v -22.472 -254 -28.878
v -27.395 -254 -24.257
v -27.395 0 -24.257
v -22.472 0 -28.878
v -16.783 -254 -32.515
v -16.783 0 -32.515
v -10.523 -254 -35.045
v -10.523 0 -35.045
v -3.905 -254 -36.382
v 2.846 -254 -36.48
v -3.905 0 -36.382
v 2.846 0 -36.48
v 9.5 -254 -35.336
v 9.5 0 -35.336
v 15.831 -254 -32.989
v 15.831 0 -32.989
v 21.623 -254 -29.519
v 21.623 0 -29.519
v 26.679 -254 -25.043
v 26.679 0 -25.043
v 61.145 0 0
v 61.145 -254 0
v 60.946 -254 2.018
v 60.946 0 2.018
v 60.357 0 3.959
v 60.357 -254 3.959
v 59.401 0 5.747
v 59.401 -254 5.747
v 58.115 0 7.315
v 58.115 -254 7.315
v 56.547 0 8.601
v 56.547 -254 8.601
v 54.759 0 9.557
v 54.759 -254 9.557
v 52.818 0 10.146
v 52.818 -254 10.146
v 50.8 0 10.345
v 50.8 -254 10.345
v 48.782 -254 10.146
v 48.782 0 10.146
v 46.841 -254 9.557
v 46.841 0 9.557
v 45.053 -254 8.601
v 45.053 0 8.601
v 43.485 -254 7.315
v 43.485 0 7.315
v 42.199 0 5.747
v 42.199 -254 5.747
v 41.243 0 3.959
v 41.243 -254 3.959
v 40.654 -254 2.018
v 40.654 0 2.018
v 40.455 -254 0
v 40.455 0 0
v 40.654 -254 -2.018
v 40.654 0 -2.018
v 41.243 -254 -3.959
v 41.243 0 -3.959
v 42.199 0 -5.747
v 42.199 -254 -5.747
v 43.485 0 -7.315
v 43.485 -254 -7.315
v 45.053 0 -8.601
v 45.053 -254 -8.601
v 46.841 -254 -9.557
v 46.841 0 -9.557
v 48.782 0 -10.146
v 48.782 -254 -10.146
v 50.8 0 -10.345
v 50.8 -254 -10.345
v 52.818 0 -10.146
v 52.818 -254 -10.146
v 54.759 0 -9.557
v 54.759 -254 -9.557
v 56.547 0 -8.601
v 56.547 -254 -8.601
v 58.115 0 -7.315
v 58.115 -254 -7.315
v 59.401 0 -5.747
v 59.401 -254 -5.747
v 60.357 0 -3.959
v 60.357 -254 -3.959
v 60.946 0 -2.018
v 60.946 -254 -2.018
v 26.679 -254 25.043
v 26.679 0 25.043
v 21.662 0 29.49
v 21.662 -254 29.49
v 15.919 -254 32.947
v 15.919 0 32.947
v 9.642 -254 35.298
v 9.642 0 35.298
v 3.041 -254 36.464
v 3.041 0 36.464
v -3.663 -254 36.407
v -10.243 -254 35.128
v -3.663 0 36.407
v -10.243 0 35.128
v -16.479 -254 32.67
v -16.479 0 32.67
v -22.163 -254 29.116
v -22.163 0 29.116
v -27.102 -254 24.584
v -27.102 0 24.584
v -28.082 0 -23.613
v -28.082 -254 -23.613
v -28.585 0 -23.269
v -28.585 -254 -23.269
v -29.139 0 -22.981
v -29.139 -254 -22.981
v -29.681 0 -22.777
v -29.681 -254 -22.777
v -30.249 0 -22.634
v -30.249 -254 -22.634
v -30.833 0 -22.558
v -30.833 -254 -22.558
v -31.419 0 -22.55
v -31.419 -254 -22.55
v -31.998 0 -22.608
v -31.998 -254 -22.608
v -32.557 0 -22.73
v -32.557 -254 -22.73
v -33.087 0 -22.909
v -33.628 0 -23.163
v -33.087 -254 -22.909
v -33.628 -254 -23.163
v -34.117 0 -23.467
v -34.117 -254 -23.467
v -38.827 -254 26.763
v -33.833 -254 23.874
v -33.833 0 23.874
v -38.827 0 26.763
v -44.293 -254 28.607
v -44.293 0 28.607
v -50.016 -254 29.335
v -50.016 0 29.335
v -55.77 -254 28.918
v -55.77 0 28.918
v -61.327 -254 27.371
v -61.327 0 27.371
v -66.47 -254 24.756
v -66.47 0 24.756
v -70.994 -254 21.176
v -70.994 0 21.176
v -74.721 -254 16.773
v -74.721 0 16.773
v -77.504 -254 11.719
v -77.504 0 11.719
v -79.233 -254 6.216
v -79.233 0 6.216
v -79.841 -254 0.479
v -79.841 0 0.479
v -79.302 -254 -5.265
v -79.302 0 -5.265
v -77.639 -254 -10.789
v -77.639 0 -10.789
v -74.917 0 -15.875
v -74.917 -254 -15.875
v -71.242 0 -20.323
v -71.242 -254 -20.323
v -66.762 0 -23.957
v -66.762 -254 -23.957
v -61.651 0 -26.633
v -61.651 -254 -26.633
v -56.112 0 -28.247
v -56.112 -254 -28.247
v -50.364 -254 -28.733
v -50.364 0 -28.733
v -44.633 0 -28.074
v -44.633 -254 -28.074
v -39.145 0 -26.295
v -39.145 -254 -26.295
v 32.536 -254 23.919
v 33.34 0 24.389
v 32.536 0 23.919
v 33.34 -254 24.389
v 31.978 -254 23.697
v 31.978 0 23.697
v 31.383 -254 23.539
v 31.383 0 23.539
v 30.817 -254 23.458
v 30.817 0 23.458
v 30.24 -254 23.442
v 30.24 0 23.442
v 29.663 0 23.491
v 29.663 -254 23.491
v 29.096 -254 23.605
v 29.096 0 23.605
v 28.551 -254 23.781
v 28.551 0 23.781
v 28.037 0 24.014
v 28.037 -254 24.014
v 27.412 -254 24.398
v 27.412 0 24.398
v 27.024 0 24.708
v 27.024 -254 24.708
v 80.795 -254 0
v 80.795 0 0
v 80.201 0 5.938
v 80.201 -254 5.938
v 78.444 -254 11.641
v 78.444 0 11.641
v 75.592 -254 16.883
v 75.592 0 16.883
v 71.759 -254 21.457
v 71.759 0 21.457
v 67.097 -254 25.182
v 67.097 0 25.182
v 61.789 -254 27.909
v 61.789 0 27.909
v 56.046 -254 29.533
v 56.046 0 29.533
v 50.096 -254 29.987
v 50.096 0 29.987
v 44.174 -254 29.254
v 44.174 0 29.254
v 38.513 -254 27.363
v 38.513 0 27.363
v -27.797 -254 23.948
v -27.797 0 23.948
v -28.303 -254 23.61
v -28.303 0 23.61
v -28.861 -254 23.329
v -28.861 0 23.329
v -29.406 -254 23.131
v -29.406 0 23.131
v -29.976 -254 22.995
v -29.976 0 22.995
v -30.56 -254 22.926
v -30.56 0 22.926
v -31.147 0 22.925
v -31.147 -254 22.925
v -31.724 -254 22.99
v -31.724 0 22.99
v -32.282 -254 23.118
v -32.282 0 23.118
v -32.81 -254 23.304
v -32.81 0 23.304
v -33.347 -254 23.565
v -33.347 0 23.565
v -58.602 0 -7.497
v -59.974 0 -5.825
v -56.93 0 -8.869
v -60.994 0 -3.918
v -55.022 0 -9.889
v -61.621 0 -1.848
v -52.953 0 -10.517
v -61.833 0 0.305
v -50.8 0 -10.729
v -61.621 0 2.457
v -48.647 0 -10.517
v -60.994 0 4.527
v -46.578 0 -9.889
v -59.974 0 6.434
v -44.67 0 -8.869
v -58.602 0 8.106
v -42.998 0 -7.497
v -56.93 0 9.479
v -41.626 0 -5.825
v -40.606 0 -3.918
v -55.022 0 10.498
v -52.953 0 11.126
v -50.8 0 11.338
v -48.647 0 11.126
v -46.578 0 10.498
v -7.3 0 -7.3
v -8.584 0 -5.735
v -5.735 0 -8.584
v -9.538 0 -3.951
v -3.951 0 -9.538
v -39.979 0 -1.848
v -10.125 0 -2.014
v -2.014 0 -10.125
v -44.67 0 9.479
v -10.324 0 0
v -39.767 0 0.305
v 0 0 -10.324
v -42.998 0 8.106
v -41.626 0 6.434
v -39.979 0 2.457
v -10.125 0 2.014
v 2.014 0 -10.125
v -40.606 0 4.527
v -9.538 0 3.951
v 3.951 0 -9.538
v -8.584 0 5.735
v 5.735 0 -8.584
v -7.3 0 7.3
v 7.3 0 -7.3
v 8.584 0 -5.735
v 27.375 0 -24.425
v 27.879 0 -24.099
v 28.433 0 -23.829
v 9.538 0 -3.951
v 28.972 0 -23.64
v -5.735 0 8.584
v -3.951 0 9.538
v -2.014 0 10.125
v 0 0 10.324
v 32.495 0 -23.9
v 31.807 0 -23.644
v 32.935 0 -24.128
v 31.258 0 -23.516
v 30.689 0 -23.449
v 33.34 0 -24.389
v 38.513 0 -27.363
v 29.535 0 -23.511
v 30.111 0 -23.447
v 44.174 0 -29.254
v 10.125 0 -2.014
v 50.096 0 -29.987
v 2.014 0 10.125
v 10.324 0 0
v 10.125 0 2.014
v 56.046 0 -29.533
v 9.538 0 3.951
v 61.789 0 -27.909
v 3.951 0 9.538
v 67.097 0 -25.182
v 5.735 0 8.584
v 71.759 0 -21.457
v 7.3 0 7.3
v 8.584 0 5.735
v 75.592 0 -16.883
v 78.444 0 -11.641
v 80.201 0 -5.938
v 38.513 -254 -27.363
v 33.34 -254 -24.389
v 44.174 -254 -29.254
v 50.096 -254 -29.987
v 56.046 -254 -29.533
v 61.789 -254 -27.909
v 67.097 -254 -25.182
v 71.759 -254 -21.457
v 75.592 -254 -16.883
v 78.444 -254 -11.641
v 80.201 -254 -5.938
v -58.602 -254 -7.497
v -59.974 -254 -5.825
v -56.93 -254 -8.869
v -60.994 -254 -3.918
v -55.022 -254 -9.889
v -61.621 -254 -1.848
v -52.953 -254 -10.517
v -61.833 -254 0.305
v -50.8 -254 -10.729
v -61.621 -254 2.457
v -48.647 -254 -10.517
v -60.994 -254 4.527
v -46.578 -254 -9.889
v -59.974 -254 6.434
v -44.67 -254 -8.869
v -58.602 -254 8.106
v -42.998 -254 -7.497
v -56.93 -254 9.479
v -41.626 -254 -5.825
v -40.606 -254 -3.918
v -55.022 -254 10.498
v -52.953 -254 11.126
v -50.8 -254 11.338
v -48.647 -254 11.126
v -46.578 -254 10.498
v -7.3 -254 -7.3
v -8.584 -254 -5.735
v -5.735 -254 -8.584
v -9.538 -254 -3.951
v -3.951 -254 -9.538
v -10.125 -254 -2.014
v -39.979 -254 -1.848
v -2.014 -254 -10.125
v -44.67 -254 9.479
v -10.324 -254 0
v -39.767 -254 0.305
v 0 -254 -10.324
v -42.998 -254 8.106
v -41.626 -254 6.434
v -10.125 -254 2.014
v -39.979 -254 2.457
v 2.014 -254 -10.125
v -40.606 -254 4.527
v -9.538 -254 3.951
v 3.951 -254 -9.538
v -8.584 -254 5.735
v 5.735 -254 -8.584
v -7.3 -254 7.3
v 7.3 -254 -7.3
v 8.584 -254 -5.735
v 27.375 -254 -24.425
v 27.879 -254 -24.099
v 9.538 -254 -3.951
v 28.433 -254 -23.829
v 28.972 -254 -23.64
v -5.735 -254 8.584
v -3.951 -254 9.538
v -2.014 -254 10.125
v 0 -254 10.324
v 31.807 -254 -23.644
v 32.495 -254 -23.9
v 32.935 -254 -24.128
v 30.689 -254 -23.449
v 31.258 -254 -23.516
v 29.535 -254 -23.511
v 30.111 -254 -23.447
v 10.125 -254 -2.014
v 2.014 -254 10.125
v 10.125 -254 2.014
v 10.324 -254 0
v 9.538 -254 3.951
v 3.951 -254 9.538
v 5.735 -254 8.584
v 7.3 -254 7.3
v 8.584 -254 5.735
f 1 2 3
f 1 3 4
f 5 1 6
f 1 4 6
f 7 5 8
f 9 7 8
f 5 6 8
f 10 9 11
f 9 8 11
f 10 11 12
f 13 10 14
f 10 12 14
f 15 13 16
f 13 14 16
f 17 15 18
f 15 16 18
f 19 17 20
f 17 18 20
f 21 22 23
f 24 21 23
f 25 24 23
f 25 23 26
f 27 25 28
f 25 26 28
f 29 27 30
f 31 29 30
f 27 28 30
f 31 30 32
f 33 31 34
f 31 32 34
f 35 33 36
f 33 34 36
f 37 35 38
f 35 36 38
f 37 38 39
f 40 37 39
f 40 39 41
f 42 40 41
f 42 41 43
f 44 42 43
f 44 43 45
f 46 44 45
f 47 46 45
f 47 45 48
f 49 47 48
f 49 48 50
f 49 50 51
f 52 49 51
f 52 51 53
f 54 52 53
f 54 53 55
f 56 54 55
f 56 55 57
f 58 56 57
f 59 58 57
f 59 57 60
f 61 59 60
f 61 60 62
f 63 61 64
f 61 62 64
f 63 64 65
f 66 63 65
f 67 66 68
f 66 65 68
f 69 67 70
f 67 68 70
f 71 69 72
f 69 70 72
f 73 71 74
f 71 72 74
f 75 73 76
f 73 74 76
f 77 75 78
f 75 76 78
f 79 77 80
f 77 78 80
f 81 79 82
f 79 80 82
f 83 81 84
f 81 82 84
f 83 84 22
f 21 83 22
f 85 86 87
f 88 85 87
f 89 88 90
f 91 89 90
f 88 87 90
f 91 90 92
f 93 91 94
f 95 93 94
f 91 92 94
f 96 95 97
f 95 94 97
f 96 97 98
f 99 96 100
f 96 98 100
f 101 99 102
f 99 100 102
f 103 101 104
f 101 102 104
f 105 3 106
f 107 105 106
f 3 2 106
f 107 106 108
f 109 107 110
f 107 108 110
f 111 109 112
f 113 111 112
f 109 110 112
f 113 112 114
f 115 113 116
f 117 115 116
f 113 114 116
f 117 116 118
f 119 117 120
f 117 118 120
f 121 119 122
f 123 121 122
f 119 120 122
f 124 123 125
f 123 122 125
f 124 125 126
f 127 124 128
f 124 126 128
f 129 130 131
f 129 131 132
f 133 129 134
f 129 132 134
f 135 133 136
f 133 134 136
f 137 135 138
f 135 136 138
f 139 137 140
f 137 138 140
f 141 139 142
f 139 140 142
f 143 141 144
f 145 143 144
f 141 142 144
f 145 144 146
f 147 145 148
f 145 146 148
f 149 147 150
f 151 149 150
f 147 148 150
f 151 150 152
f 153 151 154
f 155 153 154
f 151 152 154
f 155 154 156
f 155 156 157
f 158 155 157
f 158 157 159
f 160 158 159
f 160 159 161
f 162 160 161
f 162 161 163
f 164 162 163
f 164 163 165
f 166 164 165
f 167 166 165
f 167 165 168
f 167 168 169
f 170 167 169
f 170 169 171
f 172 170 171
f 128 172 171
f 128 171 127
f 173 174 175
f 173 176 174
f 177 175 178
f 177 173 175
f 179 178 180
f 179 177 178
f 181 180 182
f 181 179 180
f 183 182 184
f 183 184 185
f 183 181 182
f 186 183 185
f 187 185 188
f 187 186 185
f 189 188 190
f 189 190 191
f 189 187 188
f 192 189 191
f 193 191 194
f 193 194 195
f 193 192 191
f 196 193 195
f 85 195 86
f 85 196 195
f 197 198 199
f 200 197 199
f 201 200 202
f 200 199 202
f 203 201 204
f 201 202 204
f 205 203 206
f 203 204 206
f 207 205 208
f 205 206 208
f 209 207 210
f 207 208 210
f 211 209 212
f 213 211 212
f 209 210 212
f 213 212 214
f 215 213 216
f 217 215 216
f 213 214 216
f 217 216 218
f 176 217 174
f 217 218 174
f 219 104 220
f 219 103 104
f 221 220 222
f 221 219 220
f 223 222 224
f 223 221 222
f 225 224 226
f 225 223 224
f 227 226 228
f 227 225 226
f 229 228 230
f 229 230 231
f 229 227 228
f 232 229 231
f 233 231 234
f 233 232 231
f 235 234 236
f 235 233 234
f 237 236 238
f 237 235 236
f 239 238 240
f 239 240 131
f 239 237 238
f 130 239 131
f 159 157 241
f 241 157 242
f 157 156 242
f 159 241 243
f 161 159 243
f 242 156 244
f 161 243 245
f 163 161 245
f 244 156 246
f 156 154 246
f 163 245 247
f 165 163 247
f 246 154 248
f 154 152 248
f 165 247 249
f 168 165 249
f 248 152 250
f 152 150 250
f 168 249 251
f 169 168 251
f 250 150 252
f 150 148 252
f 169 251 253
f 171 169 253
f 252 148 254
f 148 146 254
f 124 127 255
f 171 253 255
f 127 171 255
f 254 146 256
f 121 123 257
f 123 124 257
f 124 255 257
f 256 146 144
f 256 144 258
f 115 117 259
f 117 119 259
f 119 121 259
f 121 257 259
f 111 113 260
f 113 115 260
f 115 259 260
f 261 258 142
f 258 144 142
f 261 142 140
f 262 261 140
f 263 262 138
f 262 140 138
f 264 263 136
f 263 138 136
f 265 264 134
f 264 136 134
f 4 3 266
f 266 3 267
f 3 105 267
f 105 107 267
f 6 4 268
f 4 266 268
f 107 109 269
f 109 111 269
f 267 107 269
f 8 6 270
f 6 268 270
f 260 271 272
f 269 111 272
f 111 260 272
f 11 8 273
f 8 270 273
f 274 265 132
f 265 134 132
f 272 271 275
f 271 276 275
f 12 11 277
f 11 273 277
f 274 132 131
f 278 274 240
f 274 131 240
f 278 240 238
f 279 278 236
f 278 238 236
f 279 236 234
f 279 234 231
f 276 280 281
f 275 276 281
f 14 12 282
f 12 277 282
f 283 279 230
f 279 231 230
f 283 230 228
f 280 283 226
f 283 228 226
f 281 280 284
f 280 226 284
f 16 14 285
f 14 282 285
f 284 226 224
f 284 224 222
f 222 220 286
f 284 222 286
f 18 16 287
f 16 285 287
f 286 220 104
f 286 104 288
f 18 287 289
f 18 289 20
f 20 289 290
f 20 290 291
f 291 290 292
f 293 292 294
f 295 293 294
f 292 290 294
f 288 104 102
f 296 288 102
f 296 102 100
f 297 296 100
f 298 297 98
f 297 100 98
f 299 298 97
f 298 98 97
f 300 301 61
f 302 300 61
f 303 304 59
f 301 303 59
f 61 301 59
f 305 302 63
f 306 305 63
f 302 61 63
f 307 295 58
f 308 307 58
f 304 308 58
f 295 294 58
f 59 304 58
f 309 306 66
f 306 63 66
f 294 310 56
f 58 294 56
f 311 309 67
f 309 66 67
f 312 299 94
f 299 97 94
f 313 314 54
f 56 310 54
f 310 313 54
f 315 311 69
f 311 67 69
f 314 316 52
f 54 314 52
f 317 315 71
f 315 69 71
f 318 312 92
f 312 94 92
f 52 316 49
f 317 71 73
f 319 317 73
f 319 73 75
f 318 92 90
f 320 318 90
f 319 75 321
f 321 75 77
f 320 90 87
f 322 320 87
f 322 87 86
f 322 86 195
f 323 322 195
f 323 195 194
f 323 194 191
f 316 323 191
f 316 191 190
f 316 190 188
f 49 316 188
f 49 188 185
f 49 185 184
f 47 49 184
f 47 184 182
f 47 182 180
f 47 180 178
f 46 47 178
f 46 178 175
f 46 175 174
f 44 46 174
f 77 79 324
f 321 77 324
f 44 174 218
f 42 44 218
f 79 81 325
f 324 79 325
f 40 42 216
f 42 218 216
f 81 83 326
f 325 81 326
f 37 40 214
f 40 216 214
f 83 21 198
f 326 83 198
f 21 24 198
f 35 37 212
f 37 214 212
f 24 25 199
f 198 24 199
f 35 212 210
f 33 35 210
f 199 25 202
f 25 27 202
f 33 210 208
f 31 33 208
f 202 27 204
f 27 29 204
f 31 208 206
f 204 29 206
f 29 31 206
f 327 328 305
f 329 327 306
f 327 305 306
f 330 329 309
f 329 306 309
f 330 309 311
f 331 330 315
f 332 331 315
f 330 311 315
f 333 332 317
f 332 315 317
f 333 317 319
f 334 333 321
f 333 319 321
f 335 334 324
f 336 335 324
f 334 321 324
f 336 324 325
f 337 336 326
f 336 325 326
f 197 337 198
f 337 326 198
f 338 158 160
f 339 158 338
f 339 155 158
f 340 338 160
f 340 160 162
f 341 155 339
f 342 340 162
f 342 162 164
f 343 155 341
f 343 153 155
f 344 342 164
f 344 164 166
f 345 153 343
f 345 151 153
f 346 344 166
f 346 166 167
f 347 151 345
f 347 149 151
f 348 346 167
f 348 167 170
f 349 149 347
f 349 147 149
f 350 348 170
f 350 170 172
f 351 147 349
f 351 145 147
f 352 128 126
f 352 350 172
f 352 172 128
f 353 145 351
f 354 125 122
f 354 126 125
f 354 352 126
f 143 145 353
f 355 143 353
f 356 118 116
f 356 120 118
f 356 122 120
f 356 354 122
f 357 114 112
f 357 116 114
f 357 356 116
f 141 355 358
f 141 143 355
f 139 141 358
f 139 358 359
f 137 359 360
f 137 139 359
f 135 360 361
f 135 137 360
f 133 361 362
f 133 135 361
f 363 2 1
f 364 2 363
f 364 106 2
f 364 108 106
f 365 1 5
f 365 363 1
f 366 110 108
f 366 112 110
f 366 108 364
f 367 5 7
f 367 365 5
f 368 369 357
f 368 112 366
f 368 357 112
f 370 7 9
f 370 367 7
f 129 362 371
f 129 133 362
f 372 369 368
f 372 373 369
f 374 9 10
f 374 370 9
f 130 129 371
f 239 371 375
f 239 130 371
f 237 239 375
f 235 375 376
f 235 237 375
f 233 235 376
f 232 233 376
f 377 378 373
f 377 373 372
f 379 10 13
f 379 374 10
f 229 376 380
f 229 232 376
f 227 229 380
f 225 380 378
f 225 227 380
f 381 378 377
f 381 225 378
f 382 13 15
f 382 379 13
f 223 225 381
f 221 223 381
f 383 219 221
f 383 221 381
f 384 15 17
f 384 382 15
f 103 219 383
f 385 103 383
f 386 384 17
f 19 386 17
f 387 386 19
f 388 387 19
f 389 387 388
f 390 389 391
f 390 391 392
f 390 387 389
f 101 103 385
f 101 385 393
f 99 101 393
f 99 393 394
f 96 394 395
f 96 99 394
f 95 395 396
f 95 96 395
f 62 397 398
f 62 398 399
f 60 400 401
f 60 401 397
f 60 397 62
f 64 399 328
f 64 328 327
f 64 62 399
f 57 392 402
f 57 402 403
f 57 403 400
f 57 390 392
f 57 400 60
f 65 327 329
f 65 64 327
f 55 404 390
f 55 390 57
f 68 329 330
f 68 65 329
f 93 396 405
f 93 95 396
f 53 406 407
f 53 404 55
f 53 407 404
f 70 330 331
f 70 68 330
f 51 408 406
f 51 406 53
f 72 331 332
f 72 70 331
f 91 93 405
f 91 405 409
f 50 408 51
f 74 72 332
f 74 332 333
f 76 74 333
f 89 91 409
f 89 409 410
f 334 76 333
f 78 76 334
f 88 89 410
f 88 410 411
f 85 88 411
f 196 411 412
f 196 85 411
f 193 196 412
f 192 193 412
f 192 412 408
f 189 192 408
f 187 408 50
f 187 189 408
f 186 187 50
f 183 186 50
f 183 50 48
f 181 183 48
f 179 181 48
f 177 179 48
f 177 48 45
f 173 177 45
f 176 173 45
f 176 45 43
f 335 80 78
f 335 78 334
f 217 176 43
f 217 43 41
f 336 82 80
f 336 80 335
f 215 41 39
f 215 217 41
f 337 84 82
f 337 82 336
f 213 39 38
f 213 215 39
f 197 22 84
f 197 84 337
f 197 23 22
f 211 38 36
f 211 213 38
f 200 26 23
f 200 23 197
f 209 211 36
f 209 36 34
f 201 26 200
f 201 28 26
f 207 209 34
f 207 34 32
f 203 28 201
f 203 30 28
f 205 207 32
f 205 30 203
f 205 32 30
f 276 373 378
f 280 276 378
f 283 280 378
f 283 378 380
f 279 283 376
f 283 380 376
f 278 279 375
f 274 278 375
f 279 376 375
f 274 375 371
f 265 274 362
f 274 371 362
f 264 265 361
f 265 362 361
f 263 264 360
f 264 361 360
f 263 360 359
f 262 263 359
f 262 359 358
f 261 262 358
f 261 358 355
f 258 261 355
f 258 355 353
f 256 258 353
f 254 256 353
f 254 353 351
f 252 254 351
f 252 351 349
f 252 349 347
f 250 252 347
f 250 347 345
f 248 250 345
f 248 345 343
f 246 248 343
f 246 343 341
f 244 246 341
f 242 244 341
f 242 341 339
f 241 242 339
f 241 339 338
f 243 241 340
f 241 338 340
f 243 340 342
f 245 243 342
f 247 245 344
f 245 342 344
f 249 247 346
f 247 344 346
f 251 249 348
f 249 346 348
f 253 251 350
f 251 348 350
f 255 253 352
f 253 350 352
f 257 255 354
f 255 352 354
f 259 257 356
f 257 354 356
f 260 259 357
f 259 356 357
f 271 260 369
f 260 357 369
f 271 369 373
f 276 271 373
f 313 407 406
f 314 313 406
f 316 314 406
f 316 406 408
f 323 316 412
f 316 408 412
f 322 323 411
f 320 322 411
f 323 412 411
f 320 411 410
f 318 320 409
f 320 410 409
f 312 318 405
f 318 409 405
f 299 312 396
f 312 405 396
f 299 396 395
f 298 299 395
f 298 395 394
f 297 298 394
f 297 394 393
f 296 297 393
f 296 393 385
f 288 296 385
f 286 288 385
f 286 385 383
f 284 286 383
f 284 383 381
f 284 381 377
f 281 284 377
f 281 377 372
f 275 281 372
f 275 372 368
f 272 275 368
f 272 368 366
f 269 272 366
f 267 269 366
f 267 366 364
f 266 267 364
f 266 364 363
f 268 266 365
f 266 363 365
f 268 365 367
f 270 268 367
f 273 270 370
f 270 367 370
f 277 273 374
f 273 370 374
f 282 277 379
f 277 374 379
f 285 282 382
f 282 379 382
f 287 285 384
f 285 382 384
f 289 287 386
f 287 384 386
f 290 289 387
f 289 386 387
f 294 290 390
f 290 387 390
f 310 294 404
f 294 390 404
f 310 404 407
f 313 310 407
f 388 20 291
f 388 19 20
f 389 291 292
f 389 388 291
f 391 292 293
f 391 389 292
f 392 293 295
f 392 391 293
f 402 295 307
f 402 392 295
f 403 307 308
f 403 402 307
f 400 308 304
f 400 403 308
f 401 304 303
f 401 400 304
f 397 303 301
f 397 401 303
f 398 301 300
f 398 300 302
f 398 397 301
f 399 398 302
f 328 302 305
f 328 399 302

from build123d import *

# Parameters (mm, degrees)
F1_DEPTH = 254
F2_R     = 5.08
F3_R     = 11.0334695749
F3_R_2   = 10.3236193182
F3_R_3   = 10.3446634655
F4_DEPTH = 461.264


# Not quite as in the source:
# - the program builds the solid bodies; features that only make, move or delete a surface that nothing else refers to are left out


with BuildPart() as f1:
    # F0 (on Front) → F1 (new body)
    with BuildSketch(Plane.XZ):
        with BuildLine():
            ThreePointArc((-30.4000387615, -20.3651585358), (-24.0059784619, -10.8970905515), (-21.758691331, 0.3046065976))
            ThreePointArc((-21.758691331, 0.3046065976), (-23.9392938004, 11.3454431448), (-30.1536347581, 20.7282500411))
            ThreePointArc((-30.1536347581, 20.7282500411), (-36.5903525714, 0.2194028111), (-30.4000387615, -20.3651585358))
        make_face()
        with BuildLine():
            ThreePointArc((-30.1536347581, 20.7282500411), (-23.9392938004, 11.3454431448), (-21.758691331, 0.3046065976))
            ThreePointArc((-21.758691331, 0.3046065976), (-24.0059784619, -10.8970905515), (-30.4000387615, -20.3651585358))
            ThreePointArc((-30.4000387615, -20.3651585358), (-0.593995823, -36.5861887582), (29.7229129207, -21.3412859593))
            ThreePointArc((29.7229129207, -21.3412859593), (20.8050989976, 0), (29.7229129207, 21.3412859593))
            ThreePointArc((29.7229129207, 21.3412859593), (-0.3746112446, 36.5890927095), (-30.1536347581, 20.7282500411))
        make_face()
        with BuildLine():
            ThreePointArc((-30.4000387615, -20.3651585358), (-36.5903525714, 0.2194028111), (-30.1536347581, 20.7282500411))
            ThreePointArc((-30.1536347581, 20.7282500411), (-79.8407866027, 0.4787407551), (-30.4000387615, -20.3651585358))
        make_face()
        with BuildLine():
            ThreePointArc((36.5910103562, 0), (34.8316914131, 11.2096080304), (29.7229129207, 21.3412859593))
            ThreePointArc((29.7229129207, 21.3412859593), (20.8050989976, 0), (29.7229129207, -21.3412859593))
            ThreePointArc((29.7229129207, -21.3412859593), (34.8316914131, -11.2096080304), (36.5910103562, 0))
        make_face()
        with BuildLine():
            ThreePointArc((80.7949010024, 0), (62.364794546, 27.6757947177), (29.7229129207, 21.3412859593))
            ThreePointArc((29.7229129207, 21.3412859593), (34.8316914131, 11.2096080304), (36.5910103562, 0))
            ThreePointArc((36.5910103562, 0), (34.8316914131, -11.2096080304), (29.7229129207, -21.3412859593))
            ThreePointArc((29.7229129207, -21.3412859593), (62.364794546, -27.6757947177), (80.7949010024, 0))
        make_face()
    extrude(amount=F1_DEPTH)

    # F2
    f2_edges = [f1.edges().sort_by_distance(p)[0] for p in [
        (29.722913, -127, 21.341286),
        (-30.153635, -127, 20.72825),
        (29.722913, -127, -21.341286),
        (-30.400039, -127, -20.365159),
    ]]
    fillet(f2_edges, radius=F2_R)

    # F3 (on face) → F4 (cut)
    with BuildSketch(Plane.XZ.offset(254)):
        with Locations((-50.8, 0.3046065976)):
            Circle(F3_R)
        Circle(F3_R_2)
        with Locations((50.8, 0)):
            Circle(F3_R_3)
    extrude(amount=-F4_DEPTH, mode=Mode.SUBTRACT)


solid = f1.part
